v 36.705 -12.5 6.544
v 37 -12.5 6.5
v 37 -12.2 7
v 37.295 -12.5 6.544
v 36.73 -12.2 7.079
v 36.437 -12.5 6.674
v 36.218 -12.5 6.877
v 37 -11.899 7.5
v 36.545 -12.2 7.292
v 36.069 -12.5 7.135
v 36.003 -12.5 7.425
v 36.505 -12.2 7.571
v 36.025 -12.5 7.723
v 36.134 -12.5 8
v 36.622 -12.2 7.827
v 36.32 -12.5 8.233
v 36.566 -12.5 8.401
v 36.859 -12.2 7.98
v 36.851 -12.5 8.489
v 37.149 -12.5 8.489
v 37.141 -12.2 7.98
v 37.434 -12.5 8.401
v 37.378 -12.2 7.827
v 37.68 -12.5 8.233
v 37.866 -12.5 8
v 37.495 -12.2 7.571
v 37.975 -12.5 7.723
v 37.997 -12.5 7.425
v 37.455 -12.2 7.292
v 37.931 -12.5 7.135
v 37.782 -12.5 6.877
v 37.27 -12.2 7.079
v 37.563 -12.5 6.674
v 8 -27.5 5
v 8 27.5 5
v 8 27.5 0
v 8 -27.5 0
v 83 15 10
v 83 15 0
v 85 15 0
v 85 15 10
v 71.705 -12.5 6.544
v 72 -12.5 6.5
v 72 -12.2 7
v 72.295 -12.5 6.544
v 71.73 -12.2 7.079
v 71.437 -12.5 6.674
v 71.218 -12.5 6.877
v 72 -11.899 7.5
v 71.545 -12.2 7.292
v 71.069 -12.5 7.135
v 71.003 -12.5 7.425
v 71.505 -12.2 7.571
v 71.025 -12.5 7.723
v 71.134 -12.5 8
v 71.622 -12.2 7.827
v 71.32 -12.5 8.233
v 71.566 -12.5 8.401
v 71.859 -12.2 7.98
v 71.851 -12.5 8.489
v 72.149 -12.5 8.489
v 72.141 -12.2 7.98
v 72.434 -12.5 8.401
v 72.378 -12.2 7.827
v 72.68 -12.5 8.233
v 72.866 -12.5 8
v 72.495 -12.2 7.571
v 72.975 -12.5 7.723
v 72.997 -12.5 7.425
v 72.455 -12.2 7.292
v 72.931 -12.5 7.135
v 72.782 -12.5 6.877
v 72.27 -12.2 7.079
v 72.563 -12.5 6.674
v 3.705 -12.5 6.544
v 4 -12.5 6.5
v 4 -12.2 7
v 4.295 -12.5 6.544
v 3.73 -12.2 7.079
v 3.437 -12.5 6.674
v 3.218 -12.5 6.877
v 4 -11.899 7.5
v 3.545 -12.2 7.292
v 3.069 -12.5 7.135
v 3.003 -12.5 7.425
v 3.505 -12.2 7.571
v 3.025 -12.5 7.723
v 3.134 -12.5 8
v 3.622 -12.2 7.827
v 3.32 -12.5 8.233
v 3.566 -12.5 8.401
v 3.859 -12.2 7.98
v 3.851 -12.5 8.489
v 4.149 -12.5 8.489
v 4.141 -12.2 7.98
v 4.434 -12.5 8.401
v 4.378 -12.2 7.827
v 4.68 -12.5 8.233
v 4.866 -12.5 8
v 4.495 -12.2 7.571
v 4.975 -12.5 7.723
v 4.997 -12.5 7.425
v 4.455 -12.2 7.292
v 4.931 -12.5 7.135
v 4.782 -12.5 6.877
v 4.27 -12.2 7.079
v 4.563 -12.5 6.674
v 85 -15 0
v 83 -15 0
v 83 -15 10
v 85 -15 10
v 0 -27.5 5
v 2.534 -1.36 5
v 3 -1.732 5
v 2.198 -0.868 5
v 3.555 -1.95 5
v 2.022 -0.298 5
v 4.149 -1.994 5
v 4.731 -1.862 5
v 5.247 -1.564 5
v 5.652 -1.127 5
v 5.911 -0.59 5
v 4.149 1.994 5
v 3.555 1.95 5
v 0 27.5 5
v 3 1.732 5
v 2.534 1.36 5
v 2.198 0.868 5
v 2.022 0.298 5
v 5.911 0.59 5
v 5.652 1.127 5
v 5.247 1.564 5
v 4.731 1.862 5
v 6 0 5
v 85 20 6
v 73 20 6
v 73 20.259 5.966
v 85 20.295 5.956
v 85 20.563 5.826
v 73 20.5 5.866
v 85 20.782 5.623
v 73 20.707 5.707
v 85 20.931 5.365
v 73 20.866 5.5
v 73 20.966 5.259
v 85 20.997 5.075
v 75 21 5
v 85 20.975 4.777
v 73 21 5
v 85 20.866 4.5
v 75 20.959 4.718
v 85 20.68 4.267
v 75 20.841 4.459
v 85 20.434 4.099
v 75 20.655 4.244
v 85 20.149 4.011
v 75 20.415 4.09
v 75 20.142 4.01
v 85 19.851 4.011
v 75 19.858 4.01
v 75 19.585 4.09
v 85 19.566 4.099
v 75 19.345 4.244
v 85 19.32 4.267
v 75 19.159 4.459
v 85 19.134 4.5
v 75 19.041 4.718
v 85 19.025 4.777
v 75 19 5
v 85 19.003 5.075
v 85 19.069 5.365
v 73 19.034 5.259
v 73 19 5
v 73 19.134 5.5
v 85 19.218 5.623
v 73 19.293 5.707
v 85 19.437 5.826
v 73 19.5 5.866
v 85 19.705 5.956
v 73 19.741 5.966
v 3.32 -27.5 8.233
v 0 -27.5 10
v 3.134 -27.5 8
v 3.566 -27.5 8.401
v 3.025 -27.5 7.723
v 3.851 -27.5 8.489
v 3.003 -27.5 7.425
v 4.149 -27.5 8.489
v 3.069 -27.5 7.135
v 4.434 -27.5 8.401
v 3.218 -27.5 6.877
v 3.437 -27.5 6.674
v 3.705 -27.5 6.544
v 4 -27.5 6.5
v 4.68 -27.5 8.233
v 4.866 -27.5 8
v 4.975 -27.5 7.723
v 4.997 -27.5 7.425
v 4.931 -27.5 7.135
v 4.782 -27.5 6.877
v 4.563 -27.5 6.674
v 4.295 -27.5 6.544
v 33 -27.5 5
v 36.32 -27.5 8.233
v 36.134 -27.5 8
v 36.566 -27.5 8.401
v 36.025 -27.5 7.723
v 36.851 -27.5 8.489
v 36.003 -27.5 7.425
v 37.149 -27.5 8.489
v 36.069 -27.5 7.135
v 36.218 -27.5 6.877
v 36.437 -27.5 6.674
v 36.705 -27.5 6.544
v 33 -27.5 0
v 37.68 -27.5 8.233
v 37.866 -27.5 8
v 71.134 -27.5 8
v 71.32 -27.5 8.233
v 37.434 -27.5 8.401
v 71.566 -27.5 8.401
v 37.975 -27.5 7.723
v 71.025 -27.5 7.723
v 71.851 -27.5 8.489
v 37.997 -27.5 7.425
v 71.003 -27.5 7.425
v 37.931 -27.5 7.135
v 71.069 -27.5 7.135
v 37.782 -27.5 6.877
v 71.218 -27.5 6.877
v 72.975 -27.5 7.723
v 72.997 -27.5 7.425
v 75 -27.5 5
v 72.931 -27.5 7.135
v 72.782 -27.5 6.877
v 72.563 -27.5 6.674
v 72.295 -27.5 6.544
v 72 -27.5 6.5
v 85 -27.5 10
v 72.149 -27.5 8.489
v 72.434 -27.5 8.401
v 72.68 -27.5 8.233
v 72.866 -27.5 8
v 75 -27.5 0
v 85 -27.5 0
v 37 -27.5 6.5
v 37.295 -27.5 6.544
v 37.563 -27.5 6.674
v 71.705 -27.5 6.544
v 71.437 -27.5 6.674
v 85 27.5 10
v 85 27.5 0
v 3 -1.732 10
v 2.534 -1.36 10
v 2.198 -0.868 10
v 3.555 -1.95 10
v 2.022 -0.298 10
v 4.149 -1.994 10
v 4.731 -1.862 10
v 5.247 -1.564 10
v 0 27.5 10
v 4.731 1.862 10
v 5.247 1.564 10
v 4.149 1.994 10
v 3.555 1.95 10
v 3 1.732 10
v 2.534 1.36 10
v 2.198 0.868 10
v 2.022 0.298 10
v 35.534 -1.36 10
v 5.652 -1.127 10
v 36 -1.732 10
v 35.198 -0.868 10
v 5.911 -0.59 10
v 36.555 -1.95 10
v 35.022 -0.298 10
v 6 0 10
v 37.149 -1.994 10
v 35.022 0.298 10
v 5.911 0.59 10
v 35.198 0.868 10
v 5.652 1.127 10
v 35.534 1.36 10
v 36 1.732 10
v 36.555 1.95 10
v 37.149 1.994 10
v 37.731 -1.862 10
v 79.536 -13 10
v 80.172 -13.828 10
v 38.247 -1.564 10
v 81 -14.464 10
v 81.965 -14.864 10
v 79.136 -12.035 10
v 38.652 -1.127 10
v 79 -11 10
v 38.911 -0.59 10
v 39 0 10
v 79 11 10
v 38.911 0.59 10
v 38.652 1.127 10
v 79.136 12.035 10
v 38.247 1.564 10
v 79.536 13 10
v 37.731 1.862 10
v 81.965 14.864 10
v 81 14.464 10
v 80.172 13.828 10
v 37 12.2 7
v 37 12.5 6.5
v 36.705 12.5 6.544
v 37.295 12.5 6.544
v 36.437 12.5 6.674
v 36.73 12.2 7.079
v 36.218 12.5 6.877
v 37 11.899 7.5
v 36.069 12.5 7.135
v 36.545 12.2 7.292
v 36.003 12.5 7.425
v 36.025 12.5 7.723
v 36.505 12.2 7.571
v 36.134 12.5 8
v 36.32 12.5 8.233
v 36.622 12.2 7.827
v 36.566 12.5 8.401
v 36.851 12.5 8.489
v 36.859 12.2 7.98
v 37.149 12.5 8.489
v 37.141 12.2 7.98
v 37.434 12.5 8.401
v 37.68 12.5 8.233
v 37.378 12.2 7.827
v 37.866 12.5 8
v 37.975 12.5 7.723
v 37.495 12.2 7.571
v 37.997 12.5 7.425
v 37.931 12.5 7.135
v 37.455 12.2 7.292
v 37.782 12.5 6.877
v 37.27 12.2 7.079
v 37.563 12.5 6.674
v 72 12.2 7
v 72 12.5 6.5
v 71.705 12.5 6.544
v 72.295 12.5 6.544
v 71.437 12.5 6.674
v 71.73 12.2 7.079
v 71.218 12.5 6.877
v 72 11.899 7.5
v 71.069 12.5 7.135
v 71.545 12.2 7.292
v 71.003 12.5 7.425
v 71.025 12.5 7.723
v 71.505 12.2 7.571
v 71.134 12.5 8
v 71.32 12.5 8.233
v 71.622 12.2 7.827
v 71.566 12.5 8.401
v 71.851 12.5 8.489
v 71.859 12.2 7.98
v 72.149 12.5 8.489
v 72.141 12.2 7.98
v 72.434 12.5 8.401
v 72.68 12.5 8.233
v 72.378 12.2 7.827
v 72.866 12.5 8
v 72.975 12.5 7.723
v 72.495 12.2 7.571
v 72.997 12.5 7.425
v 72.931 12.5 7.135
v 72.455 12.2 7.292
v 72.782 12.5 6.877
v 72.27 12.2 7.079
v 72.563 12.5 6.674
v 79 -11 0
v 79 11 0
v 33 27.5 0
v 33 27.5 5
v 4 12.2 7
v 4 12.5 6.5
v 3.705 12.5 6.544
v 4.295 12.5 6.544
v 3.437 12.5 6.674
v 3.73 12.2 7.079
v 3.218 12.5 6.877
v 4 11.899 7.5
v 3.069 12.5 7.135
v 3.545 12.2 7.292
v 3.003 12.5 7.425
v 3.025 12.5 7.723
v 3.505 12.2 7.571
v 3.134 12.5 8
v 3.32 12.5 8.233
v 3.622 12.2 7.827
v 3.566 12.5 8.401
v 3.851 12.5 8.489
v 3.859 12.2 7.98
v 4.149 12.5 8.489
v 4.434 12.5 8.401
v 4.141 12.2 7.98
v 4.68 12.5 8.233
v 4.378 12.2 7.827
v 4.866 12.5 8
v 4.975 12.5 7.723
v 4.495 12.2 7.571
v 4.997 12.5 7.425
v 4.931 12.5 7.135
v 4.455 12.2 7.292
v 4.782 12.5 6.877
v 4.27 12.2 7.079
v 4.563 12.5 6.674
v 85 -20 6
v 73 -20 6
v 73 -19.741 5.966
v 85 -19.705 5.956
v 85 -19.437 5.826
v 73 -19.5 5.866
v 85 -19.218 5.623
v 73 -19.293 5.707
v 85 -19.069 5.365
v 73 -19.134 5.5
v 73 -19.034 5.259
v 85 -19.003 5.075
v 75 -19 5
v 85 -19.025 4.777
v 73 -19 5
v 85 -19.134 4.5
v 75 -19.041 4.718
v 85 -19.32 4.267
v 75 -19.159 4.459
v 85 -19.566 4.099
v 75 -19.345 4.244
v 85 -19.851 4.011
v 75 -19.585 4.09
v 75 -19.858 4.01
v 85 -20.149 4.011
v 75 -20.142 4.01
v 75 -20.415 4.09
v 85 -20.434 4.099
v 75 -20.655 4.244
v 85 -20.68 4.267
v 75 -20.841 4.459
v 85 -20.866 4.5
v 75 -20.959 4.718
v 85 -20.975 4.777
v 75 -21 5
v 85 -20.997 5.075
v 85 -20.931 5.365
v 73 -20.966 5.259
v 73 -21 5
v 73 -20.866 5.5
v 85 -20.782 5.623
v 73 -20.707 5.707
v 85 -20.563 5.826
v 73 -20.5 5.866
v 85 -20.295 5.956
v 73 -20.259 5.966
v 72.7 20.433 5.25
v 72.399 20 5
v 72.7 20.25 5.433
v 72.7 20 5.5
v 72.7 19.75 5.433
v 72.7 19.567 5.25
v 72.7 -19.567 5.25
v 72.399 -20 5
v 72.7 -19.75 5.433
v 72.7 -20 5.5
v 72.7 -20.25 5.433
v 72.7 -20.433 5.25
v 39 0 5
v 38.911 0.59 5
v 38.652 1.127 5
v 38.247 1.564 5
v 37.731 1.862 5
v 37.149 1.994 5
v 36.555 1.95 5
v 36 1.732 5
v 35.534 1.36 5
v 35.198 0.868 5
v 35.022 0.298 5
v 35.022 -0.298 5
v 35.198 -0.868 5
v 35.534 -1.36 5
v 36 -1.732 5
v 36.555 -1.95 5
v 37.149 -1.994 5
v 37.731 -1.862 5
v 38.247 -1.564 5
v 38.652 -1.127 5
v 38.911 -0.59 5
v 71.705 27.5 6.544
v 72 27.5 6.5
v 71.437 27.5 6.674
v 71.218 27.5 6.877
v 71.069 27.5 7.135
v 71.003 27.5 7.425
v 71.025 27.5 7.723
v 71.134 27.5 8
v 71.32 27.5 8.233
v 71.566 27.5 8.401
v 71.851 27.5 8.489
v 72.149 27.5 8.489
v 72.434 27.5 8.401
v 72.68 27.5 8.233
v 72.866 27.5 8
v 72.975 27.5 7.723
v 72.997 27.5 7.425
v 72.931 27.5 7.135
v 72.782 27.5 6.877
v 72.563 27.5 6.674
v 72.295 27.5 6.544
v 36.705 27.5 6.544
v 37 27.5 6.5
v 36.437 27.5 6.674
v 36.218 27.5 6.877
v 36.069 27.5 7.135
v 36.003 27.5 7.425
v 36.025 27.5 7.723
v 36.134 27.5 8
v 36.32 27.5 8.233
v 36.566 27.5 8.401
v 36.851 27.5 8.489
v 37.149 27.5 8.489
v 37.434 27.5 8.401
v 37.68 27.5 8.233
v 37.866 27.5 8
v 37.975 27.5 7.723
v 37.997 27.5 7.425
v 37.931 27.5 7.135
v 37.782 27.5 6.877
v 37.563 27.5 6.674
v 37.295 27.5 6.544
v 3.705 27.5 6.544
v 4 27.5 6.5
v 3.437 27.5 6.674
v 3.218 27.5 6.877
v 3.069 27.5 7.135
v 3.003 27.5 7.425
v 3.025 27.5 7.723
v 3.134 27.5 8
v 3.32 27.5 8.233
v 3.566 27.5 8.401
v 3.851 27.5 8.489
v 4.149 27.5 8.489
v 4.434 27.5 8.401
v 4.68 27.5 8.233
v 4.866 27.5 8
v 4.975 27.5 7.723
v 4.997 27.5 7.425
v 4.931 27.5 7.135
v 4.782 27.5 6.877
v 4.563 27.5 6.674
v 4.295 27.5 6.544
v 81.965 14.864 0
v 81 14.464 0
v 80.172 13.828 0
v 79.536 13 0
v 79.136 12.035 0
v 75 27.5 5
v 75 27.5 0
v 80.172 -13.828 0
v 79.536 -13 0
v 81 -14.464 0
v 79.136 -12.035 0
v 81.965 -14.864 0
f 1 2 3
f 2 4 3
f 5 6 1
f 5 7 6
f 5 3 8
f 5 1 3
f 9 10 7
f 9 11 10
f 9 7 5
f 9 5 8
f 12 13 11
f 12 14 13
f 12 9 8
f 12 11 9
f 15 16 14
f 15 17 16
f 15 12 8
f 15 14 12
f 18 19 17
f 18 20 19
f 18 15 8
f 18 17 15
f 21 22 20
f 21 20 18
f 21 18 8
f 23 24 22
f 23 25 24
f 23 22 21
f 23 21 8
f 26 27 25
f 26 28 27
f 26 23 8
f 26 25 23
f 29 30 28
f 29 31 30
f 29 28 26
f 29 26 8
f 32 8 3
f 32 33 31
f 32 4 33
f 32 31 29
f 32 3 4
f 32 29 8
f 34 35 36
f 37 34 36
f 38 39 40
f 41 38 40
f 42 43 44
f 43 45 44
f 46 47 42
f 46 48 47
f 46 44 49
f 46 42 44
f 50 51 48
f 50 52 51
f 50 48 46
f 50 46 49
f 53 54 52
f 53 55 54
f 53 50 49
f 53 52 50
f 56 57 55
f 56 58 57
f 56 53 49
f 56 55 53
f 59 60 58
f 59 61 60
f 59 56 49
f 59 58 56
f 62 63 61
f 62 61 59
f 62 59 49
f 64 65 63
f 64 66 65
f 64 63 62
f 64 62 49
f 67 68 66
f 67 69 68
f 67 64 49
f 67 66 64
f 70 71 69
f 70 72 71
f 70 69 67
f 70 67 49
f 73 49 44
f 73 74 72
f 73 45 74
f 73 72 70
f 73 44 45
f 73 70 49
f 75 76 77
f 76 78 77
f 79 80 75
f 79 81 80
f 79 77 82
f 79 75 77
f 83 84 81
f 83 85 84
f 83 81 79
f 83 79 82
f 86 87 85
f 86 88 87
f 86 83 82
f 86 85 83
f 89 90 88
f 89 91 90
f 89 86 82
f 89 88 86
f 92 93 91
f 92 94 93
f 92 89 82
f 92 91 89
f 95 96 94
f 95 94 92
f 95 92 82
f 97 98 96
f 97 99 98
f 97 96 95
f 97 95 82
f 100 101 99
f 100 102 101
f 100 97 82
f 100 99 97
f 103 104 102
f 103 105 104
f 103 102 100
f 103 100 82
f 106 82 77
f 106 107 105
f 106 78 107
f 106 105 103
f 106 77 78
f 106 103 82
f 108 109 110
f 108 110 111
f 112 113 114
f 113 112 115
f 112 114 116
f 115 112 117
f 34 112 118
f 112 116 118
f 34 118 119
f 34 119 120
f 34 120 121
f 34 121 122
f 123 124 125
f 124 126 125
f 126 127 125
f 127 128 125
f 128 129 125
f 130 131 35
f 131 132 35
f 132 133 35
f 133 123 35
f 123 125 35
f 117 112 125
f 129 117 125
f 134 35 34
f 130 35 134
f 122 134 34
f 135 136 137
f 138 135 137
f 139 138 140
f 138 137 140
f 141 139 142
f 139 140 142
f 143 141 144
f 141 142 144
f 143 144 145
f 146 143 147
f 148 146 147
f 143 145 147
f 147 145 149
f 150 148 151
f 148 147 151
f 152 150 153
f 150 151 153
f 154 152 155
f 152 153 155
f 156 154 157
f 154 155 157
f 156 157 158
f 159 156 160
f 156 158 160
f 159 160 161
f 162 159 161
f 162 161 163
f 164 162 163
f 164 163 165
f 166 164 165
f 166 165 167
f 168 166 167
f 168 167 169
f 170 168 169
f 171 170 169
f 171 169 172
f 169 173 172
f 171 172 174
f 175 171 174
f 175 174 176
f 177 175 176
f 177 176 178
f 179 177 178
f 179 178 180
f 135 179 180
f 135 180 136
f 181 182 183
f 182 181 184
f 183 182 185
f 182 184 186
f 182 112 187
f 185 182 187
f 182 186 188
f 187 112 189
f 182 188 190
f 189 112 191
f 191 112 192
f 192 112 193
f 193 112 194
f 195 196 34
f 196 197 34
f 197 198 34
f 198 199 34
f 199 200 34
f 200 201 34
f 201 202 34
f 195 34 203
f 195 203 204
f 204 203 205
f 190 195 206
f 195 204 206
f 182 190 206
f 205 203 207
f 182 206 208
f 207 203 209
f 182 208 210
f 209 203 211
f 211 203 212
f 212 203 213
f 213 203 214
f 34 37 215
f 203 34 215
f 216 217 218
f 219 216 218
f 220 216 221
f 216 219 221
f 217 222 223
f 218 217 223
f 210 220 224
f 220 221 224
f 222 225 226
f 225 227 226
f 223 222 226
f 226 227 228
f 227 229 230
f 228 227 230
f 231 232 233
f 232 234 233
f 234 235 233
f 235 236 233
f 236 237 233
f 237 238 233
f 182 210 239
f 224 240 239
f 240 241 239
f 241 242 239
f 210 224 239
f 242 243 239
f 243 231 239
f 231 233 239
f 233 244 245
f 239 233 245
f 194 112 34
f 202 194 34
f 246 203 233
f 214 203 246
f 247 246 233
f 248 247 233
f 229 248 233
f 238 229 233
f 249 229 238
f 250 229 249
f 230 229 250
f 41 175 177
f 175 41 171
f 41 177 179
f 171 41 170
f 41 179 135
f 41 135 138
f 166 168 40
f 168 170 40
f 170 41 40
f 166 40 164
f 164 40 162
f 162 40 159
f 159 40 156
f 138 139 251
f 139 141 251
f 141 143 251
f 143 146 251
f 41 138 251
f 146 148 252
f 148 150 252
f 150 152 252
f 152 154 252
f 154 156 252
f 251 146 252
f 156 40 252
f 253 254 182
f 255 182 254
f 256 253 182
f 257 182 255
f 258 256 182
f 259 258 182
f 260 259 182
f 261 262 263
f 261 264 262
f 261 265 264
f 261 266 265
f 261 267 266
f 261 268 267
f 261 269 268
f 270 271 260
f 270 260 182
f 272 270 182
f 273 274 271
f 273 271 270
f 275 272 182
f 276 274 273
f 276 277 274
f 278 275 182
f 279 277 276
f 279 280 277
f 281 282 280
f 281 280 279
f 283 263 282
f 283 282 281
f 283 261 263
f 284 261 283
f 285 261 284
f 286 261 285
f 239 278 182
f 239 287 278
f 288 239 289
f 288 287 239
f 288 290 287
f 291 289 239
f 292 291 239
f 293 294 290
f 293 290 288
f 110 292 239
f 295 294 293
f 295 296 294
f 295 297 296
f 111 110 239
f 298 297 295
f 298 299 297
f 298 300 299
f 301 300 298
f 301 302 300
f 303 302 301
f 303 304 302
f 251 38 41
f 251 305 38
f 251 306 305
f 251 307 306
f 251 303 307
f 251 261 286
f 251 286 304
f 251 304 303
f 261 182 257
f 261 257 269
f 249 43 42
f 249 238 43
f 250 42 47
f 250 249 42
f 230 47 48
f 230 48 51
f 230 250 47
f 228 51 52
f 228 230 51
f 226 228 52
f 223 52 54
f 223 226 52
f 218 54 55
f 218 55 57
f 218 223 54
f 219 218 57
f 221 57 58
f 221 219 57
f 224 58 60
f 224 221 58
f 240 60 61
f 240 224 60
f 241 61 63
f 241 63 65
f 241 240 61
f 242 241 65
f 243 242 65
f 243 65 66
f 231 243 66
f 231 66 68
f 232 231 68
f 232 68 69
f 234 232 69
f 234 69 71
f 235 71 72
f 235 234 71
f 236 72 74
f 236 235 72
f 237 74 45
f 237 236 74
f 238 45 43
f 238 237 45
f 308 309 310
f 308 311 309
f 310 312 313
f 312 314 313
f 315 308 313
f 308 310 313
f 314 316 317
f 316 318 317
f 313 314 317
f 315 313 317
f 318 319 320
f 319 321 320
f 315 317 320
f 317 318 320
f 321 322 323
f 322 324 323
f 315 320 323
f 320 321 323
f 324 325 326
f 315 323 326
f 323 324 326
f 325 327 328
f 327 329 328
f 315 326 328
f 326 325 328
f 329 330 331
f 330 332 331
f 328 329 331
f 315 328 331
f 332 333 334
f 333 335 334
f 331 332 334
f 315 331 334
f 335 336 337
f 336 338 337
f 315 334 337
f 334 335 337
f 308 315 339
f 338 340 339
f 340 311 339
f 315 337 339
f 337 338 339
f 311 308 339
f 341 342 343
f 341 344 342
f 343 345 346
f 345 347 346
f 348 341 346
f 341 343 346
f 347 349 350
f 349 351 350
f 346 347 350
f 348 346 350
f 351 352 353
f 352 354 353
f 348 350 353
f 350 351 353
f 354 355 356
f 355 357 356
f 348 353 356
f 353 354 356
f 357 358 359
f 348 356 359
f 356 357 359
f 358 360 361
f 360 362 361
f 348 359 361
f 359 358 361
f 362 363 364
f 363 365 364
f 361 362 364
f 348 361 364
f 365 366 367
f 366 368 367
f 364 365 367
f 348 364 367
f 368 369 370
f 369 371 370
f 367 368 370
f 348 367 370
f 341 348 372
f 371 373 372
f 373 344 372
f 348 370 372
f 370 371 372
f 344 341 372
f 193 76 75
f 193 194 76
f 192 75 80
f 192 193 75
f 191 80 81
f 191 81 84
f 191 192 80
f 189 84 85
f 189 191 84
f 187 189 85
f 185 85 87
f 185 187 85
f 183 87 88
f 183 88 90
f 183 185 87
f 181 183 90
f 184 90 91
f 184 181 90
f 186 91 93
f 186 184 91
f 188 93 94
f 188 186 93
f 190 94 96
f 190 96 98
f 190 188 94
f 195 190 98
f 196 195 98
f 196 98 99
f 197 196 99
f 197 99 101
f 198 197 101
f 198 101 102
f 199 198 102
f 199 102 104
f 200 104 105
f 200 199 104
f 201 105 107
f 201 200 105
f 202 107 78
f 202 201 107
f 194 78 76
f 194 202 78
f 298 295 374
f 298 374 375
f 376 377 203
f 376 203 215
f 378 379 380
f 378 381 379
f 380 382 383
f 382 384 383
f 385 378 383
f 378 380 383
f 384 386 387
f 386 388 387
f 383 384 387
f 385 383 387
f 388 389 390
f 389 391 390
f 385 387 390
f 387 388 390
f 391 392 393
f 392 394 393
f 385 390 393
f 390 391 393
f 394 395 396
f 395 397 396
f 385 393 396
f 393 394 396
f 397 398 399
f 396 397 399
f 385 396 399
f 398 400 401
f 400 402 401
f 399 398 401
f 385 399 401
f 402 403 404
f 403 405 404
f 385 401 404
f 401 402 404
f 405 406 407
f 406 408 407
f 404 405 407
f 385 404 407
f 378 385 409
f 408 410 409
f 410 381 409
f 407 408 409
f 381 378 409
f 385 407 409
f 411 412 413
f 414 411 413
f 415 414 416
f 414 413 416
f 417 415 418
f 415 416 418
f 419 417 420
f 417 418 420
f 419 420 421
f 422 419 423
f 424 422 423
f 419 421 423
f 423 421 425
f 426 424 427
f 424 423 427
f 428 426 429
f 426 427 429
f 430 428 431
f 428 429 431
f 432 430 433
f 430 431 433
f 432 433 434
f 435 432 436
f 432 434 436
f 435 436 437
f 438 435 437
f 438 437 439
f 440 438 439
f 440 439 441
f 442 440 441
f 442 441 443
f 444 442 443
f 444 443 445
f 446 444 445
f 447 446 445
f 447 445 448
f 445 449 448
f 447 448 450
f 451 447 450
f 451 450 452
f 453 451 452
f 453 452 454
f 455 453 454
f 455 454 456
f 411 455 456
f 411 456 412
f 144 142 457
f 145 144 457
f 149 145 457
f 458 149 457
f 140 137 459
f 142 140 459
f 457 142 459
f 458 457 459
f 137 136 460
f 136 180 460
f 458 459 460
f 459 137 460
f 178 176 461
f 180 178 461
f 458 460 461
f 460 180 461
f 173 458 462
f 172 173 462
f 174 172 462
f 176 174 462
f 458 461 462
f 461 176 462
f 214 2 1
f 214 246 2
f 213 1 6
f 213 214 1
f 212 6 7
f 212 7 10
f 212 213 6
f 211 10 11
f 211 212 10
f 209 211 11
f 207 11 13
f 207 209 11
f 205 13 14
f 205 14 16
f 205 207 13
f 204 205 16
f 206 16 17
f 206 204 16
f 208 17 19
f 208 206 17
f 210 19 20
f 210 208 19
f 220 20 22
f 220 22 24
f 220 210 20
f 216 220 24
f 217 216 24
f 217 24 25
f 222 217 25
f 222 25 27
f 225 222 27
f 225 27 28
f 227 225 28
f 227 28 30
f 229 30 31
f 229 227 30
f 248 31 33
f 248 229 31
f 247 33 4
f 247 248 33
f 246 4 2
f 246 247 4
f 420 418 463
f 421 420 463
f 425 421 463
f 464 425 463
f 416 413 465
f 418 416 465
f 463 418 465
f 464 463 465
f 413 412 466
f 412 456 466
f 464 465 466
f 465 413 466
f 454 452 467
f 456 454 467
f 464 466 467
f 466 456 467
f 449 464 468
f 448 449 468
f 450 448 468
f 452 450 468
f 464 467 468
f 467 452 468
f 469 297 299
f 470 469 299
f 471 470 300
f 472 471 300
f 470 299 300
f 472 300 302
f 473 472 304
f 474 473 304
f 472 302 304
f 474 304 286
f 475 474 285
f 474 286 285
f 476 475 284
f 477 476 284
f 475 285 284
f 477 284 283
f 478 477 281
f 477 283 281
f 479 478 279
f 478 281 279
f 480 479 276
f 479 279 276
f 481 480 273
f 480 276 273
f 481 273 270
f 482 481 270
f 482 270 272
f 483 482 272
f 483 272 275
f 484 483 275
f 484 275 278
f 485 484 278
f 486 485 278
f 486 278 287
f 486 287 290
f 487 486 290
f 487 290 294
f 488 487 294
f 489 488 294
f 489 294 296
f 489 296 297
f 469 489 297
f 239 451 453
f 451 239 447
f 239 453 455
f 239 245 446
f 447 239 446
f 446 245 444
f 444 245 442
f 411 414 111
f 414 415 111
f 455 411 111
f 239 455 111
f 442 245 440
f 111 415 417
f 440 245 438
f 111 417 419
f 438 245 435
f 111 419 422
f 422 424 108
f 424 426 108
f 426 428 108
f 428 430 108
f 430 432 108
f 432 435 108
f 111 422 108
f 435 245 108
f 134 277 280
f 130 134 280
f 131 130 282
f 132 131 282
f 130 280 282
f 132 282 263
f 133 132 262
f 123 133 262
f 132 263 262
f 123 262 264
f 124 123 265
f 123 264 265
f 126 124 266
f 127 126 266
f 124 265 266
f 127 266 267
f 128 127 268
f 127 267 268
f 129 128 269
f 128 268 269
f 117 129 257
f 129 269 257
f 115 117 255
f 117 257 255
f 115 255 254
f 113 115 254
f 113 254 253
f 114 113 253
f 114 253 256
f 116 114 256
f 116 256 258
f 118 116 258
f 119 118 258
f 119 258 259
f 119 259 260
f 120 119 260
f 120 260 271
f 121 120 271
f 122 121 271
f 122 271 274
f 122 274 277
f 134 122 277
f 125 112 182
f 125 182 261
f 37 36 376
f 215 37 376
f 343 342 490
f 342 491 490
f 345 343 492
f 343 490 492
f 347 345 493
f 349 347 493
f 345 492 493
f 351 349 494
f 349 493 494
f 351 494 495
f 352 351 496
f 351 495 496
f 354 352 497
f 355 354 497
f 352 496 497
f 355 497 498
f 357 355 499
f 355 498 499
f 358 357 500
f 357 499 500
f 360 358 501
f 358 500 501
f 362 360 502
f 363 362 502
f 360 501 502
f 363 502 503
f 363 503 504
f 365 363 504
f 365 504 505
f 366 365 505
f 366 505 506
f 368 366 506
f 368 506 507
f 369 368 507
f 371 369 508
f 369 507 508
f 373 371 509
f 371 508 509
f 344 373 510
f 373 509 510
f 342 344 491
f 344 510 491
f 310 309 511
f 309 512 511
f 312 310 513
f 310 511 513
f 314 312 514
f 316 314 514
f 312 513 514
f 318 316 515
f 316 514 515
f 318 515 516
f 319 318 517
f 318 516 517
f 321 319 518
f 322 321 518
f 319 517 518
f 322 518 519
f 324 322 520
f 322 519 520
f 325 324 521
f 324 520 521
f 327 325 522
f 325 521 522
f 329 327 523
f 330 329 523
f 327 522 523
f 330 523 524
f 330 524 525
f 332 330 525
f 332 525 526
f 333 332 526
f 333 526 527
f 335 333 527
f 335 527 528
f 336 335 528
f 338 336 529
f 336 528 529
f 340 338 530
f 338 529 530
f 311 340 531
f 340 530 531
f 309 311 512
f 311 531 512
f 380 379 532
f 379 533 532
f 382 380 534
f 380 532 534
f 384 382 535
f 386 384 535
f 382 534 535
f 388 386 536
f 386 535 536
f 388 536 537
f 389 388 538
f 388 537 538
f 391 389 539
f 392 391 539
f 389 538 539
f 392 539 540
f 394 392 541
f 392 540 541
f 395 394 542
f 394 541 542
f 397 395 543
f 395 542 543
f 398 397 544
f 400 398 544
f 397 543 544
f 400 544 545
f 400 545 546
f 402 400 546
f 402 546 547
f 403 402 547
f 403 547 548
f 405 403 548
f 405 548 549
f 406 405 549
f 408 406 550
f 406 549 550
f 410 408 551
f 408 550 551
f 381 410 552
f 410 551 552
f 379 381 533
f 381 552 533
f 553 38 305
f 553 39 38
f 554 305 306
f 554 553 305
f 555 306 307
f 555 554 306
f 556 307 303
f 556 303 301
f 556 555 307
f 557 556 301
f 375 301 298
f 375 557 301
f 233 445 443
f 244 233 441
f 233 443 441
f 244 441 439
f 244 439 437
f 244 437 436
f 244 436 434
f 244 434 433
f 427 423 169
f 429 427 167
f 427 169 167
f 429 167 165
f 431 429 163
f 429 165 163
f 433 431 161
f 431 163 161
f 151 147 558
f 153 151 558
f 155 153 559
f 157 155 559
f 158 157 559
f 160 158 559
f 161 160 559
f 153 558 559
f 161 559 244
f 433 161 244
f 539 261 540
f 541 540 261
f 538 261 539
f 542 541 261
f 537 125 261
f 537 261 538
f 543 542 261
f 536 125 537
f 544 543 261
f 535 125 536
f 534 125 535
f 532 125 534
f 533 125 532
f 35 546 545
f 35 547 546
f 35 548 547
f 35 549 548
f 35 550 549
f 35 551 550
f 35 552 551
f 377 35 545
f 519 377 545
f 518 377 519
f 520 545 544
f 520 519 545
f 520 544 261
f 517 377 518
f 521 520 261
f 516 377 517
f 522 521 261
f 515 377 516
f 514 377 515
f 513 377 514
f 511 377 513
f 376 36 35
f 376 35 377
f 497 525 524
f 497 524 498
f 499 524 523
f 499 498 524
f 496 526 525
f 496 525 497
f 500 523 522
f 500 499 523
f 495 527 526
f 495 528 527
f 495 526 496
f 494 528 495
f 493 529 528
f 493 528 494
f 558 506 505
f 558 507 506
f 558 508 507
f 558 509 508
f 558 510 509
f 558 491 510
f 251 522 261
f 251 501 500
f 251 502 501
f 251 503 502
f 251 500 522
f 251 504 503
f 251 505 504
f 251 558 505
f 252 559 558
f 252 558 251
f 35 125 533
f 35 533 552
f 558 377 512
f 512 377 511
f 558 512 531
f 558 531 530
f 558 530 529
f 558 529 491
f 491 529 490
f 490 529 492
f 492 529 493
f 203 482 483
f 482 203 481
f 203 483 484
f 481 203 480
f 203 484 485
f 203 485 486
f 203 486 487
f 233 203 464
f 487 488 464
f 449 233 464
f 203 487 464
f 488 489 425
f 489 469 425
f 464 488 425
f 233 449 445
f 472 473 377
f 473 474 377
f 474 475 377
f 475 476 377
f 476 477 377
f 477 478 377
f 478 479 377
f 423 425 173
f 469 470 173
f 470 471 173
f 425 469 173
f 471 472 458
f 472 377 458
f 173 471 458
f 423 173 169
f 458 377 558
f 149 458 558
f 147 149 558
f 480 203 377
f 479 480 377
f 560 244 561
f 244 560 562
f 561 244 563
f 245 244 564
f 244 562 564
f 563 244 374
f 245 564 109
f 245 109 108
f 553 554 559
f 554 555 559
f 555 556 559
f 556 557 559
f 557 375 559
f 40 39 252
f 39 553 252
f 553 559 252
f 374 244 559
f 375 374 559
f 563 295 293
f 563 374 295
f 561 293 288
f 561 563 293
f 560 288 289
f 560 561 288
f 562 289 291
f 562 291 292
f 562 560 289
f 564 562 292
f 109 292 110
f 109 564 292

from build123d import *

# Parameters (mm, degrees)
ESQUISSE1_W                    = 85
ESQUISSE1_H                    = 55
BOSS_EXTRU_1_DEPTH             = 10
ESQUISSE2_W                    = 8
ESQUISSE2_H                    = 5
ESQUISSE2_W_2                  = 42
ENL_V_MAT_EXTRU_1_DEPTH        = 102.734949747
ESQUISSE3_R                    = 2
ENL_V_MAT_EXTRU_2_DEPTH        = 90.895772982
TROU_TARAUD_M3X0_51_AT_2_COUNT = 2
TROU_TARAUD_M3X0_51_AT_2_PITCH = 33
TROU_TARAUD_M3X0_51_AT_3_COUNT = 2
TROU_TARAUD_M3X0_51_AT_3_PITCH = 68
TROU_TARAUD_M3X0_52_D          = 2
TROU_TARAUD_M3X0_52_DEPTH      = 12
TROU_TARAUD_M3X0_52_TIP        = 0.600860619
ESQUISSE9_W                    = 6
ESQUISSE9_H                    = 30
ENL_V_MAT_EXTRU_4_DEPTH        = 90.895772982
CONG_1_R                       = 4


with BuildPart() as part:
    # Esquisse1 → Boss.-Extru.1 (new body)
    with BuildSketch(Plane.XY):
        with Locations((42.5, 0)):
            Rectangle(ESQUISSE1_W, ESQUISSE1_H)
    extrude(amount=BOSS_EXTRU_1_DEPTH)

    # Esquisse2 → Enlèv. mat.-Extru.1 (cut, through all)
    with BuildSketch(Plane(origin=(0, 27.5, 0), x_dir=(1, 0, 0), z_dir=(0, 1, 0))):
        with Locations((4, -2.5)):
            Rectangle(ESQUISSE2_W, ESQUISSE2_H)
        with Locations((54, -2.5)):
            Rectangle(ESQUISSE2_W_2, ESQUISSE2_H)
    extrude(amount=-ENL_V_MAT_EXTRU_1_DEPTH, mode=Mode.SUBTRACT)

    # Esquisse3 → Enlèv. mat.-Extru.2 (cut, through all)
    with BuildSketch(Plane.XY.offset(10)):
        with Locations((4, 0)):
            Circle(ESQUISSE3_R)
        with Locations((37, 0)):
            Circle(ESQUISSE3_R)
    extrude(amount=-ENL_V_MAT_EXTRU_2_DEPTH, mode=Mode.SUBTRACT)

    # Esquisse4 → Trou taraudé M3x0.51 (revolve, cut)
    with BuildSketch(Plane(origin=(4, -27.5, 7.5), x_dir=(0, 0, -1), z_dir=(1, 0, 0))):
        Polygon((0, 0), (0, 15.600860619), (1, 15), (1, 0), align=None)
    trou_taraud_m3x0_51 = revolve(axis=Axis((4, -33.85, 7.5), (0, 1, 0)), mode=Mode.SUBTRACT)

    # Trou taraudé M3x0.51 at 2: Trou taraudé M3x0.51 ×2
    with Locations(*[(i * TROU_TARAUD_M3X0_51_AT_2_PITCH, 0, 0) for i in range(1, TROU_TARAUD_M3X0_51_AT_2_COUNT)]):
        add(trou_taraud_m3x0_51, mode=Mode.SUBTRACT)

    # Trou taraudé M3x0.51 at 3: Trou taraudé M3x0.51 ×2
    with Locations(*[(i * TROU_TARAUD_M3X0_51_AT_3_PITCH, 0, 0) for i in range(1, TROU_TARAUD_M3X0_51_AT_3_COUNT)]):
        add(trou_taraud_m3x0_51, mode=Mode.SUBTRACT)

    # Symétrie1: Trou taraudé M3x0.51 across plane
    add(trou_taraud_m3x0_51.mirror(Plane.ZX), mode=Mode.SUBTRACT)

    # Symétrie1 copy 1 sketch → Symétrie1 copy 1 (revolve, cut)
    with BuildSketch(Plane(origin=(37, 27.5, 7.5), x_dir=(0, 0, -1), z_dir=(1, 0, 0))):
        Polygon((0, 0), (0, -15.600860619), (1, -15), (1, 0), align=None)
    revolve(axis=Axis((37, 33.85, 7.5), (0, 1, 0)), mode=Mode.SUBTRACT)

    # Symétrie1 copy 2 sketch → Symétrie1 copy 2 (revolve, cut)
    with BuildSketch(Plane(origin=(72, 27.5, 7.5), x_dir=(0, 0, -1), z_dir=(1, 0, 0))):
        Polygon((0, 0), (0, -15.600860619), (1, -15), (1, 0), align=None)
    revolve(axis=Axis((72, 33.85, 7.5), (0, 1, 0)), mode=Mode.SUBTRACT)

    # Trou taraudé M3x0.52
    with Locations(Plane(origin=(85, 0, 0), x_dir=(0, 0, -1), z_dir=(1, 0, 0))):
        with Locations((-5, 20), (-5, -20)):
            Hole(TROU_TARAUD_M3X0_52_D / 2, depth=TROU_TARAUD_M3X0_52_DEPTH)
            with Locations((0, 0, -(TROU_TARAUD_M3X0_52_DEPTH + TROU_TARAUD_M3X0_52_TIP / 2))):  # 118° drill point
                Cone(0, TROU_TARAUD_M3X0_52_D / 2, TROU_TARAUD_M3X0_52_TIP, mode=Mode.SUBTRACT)

    # Esquisse9 → Enlèv. mat.-Extru.4 (cut, through all)
    with BuildSketch(Plane.XY.offset(10)):
        with Locations((82, 0)):
            Rectangle(ESQUISSE9_W, ESQUISSE9_H)
    extrude(amount=-ENL_V_MAT_EXTRU_4_DEPTH, mode=Mode.SUBTRACT)

    # Congé1
    cong_1_edges = [part.edges().sort_by_distance(p)[0] for p in [
        (79, -15, 5),
        (79, 15, 5),
    ]]
    fillet(cong_1_edges, radius=CONG_1_R)


solid = part.part
